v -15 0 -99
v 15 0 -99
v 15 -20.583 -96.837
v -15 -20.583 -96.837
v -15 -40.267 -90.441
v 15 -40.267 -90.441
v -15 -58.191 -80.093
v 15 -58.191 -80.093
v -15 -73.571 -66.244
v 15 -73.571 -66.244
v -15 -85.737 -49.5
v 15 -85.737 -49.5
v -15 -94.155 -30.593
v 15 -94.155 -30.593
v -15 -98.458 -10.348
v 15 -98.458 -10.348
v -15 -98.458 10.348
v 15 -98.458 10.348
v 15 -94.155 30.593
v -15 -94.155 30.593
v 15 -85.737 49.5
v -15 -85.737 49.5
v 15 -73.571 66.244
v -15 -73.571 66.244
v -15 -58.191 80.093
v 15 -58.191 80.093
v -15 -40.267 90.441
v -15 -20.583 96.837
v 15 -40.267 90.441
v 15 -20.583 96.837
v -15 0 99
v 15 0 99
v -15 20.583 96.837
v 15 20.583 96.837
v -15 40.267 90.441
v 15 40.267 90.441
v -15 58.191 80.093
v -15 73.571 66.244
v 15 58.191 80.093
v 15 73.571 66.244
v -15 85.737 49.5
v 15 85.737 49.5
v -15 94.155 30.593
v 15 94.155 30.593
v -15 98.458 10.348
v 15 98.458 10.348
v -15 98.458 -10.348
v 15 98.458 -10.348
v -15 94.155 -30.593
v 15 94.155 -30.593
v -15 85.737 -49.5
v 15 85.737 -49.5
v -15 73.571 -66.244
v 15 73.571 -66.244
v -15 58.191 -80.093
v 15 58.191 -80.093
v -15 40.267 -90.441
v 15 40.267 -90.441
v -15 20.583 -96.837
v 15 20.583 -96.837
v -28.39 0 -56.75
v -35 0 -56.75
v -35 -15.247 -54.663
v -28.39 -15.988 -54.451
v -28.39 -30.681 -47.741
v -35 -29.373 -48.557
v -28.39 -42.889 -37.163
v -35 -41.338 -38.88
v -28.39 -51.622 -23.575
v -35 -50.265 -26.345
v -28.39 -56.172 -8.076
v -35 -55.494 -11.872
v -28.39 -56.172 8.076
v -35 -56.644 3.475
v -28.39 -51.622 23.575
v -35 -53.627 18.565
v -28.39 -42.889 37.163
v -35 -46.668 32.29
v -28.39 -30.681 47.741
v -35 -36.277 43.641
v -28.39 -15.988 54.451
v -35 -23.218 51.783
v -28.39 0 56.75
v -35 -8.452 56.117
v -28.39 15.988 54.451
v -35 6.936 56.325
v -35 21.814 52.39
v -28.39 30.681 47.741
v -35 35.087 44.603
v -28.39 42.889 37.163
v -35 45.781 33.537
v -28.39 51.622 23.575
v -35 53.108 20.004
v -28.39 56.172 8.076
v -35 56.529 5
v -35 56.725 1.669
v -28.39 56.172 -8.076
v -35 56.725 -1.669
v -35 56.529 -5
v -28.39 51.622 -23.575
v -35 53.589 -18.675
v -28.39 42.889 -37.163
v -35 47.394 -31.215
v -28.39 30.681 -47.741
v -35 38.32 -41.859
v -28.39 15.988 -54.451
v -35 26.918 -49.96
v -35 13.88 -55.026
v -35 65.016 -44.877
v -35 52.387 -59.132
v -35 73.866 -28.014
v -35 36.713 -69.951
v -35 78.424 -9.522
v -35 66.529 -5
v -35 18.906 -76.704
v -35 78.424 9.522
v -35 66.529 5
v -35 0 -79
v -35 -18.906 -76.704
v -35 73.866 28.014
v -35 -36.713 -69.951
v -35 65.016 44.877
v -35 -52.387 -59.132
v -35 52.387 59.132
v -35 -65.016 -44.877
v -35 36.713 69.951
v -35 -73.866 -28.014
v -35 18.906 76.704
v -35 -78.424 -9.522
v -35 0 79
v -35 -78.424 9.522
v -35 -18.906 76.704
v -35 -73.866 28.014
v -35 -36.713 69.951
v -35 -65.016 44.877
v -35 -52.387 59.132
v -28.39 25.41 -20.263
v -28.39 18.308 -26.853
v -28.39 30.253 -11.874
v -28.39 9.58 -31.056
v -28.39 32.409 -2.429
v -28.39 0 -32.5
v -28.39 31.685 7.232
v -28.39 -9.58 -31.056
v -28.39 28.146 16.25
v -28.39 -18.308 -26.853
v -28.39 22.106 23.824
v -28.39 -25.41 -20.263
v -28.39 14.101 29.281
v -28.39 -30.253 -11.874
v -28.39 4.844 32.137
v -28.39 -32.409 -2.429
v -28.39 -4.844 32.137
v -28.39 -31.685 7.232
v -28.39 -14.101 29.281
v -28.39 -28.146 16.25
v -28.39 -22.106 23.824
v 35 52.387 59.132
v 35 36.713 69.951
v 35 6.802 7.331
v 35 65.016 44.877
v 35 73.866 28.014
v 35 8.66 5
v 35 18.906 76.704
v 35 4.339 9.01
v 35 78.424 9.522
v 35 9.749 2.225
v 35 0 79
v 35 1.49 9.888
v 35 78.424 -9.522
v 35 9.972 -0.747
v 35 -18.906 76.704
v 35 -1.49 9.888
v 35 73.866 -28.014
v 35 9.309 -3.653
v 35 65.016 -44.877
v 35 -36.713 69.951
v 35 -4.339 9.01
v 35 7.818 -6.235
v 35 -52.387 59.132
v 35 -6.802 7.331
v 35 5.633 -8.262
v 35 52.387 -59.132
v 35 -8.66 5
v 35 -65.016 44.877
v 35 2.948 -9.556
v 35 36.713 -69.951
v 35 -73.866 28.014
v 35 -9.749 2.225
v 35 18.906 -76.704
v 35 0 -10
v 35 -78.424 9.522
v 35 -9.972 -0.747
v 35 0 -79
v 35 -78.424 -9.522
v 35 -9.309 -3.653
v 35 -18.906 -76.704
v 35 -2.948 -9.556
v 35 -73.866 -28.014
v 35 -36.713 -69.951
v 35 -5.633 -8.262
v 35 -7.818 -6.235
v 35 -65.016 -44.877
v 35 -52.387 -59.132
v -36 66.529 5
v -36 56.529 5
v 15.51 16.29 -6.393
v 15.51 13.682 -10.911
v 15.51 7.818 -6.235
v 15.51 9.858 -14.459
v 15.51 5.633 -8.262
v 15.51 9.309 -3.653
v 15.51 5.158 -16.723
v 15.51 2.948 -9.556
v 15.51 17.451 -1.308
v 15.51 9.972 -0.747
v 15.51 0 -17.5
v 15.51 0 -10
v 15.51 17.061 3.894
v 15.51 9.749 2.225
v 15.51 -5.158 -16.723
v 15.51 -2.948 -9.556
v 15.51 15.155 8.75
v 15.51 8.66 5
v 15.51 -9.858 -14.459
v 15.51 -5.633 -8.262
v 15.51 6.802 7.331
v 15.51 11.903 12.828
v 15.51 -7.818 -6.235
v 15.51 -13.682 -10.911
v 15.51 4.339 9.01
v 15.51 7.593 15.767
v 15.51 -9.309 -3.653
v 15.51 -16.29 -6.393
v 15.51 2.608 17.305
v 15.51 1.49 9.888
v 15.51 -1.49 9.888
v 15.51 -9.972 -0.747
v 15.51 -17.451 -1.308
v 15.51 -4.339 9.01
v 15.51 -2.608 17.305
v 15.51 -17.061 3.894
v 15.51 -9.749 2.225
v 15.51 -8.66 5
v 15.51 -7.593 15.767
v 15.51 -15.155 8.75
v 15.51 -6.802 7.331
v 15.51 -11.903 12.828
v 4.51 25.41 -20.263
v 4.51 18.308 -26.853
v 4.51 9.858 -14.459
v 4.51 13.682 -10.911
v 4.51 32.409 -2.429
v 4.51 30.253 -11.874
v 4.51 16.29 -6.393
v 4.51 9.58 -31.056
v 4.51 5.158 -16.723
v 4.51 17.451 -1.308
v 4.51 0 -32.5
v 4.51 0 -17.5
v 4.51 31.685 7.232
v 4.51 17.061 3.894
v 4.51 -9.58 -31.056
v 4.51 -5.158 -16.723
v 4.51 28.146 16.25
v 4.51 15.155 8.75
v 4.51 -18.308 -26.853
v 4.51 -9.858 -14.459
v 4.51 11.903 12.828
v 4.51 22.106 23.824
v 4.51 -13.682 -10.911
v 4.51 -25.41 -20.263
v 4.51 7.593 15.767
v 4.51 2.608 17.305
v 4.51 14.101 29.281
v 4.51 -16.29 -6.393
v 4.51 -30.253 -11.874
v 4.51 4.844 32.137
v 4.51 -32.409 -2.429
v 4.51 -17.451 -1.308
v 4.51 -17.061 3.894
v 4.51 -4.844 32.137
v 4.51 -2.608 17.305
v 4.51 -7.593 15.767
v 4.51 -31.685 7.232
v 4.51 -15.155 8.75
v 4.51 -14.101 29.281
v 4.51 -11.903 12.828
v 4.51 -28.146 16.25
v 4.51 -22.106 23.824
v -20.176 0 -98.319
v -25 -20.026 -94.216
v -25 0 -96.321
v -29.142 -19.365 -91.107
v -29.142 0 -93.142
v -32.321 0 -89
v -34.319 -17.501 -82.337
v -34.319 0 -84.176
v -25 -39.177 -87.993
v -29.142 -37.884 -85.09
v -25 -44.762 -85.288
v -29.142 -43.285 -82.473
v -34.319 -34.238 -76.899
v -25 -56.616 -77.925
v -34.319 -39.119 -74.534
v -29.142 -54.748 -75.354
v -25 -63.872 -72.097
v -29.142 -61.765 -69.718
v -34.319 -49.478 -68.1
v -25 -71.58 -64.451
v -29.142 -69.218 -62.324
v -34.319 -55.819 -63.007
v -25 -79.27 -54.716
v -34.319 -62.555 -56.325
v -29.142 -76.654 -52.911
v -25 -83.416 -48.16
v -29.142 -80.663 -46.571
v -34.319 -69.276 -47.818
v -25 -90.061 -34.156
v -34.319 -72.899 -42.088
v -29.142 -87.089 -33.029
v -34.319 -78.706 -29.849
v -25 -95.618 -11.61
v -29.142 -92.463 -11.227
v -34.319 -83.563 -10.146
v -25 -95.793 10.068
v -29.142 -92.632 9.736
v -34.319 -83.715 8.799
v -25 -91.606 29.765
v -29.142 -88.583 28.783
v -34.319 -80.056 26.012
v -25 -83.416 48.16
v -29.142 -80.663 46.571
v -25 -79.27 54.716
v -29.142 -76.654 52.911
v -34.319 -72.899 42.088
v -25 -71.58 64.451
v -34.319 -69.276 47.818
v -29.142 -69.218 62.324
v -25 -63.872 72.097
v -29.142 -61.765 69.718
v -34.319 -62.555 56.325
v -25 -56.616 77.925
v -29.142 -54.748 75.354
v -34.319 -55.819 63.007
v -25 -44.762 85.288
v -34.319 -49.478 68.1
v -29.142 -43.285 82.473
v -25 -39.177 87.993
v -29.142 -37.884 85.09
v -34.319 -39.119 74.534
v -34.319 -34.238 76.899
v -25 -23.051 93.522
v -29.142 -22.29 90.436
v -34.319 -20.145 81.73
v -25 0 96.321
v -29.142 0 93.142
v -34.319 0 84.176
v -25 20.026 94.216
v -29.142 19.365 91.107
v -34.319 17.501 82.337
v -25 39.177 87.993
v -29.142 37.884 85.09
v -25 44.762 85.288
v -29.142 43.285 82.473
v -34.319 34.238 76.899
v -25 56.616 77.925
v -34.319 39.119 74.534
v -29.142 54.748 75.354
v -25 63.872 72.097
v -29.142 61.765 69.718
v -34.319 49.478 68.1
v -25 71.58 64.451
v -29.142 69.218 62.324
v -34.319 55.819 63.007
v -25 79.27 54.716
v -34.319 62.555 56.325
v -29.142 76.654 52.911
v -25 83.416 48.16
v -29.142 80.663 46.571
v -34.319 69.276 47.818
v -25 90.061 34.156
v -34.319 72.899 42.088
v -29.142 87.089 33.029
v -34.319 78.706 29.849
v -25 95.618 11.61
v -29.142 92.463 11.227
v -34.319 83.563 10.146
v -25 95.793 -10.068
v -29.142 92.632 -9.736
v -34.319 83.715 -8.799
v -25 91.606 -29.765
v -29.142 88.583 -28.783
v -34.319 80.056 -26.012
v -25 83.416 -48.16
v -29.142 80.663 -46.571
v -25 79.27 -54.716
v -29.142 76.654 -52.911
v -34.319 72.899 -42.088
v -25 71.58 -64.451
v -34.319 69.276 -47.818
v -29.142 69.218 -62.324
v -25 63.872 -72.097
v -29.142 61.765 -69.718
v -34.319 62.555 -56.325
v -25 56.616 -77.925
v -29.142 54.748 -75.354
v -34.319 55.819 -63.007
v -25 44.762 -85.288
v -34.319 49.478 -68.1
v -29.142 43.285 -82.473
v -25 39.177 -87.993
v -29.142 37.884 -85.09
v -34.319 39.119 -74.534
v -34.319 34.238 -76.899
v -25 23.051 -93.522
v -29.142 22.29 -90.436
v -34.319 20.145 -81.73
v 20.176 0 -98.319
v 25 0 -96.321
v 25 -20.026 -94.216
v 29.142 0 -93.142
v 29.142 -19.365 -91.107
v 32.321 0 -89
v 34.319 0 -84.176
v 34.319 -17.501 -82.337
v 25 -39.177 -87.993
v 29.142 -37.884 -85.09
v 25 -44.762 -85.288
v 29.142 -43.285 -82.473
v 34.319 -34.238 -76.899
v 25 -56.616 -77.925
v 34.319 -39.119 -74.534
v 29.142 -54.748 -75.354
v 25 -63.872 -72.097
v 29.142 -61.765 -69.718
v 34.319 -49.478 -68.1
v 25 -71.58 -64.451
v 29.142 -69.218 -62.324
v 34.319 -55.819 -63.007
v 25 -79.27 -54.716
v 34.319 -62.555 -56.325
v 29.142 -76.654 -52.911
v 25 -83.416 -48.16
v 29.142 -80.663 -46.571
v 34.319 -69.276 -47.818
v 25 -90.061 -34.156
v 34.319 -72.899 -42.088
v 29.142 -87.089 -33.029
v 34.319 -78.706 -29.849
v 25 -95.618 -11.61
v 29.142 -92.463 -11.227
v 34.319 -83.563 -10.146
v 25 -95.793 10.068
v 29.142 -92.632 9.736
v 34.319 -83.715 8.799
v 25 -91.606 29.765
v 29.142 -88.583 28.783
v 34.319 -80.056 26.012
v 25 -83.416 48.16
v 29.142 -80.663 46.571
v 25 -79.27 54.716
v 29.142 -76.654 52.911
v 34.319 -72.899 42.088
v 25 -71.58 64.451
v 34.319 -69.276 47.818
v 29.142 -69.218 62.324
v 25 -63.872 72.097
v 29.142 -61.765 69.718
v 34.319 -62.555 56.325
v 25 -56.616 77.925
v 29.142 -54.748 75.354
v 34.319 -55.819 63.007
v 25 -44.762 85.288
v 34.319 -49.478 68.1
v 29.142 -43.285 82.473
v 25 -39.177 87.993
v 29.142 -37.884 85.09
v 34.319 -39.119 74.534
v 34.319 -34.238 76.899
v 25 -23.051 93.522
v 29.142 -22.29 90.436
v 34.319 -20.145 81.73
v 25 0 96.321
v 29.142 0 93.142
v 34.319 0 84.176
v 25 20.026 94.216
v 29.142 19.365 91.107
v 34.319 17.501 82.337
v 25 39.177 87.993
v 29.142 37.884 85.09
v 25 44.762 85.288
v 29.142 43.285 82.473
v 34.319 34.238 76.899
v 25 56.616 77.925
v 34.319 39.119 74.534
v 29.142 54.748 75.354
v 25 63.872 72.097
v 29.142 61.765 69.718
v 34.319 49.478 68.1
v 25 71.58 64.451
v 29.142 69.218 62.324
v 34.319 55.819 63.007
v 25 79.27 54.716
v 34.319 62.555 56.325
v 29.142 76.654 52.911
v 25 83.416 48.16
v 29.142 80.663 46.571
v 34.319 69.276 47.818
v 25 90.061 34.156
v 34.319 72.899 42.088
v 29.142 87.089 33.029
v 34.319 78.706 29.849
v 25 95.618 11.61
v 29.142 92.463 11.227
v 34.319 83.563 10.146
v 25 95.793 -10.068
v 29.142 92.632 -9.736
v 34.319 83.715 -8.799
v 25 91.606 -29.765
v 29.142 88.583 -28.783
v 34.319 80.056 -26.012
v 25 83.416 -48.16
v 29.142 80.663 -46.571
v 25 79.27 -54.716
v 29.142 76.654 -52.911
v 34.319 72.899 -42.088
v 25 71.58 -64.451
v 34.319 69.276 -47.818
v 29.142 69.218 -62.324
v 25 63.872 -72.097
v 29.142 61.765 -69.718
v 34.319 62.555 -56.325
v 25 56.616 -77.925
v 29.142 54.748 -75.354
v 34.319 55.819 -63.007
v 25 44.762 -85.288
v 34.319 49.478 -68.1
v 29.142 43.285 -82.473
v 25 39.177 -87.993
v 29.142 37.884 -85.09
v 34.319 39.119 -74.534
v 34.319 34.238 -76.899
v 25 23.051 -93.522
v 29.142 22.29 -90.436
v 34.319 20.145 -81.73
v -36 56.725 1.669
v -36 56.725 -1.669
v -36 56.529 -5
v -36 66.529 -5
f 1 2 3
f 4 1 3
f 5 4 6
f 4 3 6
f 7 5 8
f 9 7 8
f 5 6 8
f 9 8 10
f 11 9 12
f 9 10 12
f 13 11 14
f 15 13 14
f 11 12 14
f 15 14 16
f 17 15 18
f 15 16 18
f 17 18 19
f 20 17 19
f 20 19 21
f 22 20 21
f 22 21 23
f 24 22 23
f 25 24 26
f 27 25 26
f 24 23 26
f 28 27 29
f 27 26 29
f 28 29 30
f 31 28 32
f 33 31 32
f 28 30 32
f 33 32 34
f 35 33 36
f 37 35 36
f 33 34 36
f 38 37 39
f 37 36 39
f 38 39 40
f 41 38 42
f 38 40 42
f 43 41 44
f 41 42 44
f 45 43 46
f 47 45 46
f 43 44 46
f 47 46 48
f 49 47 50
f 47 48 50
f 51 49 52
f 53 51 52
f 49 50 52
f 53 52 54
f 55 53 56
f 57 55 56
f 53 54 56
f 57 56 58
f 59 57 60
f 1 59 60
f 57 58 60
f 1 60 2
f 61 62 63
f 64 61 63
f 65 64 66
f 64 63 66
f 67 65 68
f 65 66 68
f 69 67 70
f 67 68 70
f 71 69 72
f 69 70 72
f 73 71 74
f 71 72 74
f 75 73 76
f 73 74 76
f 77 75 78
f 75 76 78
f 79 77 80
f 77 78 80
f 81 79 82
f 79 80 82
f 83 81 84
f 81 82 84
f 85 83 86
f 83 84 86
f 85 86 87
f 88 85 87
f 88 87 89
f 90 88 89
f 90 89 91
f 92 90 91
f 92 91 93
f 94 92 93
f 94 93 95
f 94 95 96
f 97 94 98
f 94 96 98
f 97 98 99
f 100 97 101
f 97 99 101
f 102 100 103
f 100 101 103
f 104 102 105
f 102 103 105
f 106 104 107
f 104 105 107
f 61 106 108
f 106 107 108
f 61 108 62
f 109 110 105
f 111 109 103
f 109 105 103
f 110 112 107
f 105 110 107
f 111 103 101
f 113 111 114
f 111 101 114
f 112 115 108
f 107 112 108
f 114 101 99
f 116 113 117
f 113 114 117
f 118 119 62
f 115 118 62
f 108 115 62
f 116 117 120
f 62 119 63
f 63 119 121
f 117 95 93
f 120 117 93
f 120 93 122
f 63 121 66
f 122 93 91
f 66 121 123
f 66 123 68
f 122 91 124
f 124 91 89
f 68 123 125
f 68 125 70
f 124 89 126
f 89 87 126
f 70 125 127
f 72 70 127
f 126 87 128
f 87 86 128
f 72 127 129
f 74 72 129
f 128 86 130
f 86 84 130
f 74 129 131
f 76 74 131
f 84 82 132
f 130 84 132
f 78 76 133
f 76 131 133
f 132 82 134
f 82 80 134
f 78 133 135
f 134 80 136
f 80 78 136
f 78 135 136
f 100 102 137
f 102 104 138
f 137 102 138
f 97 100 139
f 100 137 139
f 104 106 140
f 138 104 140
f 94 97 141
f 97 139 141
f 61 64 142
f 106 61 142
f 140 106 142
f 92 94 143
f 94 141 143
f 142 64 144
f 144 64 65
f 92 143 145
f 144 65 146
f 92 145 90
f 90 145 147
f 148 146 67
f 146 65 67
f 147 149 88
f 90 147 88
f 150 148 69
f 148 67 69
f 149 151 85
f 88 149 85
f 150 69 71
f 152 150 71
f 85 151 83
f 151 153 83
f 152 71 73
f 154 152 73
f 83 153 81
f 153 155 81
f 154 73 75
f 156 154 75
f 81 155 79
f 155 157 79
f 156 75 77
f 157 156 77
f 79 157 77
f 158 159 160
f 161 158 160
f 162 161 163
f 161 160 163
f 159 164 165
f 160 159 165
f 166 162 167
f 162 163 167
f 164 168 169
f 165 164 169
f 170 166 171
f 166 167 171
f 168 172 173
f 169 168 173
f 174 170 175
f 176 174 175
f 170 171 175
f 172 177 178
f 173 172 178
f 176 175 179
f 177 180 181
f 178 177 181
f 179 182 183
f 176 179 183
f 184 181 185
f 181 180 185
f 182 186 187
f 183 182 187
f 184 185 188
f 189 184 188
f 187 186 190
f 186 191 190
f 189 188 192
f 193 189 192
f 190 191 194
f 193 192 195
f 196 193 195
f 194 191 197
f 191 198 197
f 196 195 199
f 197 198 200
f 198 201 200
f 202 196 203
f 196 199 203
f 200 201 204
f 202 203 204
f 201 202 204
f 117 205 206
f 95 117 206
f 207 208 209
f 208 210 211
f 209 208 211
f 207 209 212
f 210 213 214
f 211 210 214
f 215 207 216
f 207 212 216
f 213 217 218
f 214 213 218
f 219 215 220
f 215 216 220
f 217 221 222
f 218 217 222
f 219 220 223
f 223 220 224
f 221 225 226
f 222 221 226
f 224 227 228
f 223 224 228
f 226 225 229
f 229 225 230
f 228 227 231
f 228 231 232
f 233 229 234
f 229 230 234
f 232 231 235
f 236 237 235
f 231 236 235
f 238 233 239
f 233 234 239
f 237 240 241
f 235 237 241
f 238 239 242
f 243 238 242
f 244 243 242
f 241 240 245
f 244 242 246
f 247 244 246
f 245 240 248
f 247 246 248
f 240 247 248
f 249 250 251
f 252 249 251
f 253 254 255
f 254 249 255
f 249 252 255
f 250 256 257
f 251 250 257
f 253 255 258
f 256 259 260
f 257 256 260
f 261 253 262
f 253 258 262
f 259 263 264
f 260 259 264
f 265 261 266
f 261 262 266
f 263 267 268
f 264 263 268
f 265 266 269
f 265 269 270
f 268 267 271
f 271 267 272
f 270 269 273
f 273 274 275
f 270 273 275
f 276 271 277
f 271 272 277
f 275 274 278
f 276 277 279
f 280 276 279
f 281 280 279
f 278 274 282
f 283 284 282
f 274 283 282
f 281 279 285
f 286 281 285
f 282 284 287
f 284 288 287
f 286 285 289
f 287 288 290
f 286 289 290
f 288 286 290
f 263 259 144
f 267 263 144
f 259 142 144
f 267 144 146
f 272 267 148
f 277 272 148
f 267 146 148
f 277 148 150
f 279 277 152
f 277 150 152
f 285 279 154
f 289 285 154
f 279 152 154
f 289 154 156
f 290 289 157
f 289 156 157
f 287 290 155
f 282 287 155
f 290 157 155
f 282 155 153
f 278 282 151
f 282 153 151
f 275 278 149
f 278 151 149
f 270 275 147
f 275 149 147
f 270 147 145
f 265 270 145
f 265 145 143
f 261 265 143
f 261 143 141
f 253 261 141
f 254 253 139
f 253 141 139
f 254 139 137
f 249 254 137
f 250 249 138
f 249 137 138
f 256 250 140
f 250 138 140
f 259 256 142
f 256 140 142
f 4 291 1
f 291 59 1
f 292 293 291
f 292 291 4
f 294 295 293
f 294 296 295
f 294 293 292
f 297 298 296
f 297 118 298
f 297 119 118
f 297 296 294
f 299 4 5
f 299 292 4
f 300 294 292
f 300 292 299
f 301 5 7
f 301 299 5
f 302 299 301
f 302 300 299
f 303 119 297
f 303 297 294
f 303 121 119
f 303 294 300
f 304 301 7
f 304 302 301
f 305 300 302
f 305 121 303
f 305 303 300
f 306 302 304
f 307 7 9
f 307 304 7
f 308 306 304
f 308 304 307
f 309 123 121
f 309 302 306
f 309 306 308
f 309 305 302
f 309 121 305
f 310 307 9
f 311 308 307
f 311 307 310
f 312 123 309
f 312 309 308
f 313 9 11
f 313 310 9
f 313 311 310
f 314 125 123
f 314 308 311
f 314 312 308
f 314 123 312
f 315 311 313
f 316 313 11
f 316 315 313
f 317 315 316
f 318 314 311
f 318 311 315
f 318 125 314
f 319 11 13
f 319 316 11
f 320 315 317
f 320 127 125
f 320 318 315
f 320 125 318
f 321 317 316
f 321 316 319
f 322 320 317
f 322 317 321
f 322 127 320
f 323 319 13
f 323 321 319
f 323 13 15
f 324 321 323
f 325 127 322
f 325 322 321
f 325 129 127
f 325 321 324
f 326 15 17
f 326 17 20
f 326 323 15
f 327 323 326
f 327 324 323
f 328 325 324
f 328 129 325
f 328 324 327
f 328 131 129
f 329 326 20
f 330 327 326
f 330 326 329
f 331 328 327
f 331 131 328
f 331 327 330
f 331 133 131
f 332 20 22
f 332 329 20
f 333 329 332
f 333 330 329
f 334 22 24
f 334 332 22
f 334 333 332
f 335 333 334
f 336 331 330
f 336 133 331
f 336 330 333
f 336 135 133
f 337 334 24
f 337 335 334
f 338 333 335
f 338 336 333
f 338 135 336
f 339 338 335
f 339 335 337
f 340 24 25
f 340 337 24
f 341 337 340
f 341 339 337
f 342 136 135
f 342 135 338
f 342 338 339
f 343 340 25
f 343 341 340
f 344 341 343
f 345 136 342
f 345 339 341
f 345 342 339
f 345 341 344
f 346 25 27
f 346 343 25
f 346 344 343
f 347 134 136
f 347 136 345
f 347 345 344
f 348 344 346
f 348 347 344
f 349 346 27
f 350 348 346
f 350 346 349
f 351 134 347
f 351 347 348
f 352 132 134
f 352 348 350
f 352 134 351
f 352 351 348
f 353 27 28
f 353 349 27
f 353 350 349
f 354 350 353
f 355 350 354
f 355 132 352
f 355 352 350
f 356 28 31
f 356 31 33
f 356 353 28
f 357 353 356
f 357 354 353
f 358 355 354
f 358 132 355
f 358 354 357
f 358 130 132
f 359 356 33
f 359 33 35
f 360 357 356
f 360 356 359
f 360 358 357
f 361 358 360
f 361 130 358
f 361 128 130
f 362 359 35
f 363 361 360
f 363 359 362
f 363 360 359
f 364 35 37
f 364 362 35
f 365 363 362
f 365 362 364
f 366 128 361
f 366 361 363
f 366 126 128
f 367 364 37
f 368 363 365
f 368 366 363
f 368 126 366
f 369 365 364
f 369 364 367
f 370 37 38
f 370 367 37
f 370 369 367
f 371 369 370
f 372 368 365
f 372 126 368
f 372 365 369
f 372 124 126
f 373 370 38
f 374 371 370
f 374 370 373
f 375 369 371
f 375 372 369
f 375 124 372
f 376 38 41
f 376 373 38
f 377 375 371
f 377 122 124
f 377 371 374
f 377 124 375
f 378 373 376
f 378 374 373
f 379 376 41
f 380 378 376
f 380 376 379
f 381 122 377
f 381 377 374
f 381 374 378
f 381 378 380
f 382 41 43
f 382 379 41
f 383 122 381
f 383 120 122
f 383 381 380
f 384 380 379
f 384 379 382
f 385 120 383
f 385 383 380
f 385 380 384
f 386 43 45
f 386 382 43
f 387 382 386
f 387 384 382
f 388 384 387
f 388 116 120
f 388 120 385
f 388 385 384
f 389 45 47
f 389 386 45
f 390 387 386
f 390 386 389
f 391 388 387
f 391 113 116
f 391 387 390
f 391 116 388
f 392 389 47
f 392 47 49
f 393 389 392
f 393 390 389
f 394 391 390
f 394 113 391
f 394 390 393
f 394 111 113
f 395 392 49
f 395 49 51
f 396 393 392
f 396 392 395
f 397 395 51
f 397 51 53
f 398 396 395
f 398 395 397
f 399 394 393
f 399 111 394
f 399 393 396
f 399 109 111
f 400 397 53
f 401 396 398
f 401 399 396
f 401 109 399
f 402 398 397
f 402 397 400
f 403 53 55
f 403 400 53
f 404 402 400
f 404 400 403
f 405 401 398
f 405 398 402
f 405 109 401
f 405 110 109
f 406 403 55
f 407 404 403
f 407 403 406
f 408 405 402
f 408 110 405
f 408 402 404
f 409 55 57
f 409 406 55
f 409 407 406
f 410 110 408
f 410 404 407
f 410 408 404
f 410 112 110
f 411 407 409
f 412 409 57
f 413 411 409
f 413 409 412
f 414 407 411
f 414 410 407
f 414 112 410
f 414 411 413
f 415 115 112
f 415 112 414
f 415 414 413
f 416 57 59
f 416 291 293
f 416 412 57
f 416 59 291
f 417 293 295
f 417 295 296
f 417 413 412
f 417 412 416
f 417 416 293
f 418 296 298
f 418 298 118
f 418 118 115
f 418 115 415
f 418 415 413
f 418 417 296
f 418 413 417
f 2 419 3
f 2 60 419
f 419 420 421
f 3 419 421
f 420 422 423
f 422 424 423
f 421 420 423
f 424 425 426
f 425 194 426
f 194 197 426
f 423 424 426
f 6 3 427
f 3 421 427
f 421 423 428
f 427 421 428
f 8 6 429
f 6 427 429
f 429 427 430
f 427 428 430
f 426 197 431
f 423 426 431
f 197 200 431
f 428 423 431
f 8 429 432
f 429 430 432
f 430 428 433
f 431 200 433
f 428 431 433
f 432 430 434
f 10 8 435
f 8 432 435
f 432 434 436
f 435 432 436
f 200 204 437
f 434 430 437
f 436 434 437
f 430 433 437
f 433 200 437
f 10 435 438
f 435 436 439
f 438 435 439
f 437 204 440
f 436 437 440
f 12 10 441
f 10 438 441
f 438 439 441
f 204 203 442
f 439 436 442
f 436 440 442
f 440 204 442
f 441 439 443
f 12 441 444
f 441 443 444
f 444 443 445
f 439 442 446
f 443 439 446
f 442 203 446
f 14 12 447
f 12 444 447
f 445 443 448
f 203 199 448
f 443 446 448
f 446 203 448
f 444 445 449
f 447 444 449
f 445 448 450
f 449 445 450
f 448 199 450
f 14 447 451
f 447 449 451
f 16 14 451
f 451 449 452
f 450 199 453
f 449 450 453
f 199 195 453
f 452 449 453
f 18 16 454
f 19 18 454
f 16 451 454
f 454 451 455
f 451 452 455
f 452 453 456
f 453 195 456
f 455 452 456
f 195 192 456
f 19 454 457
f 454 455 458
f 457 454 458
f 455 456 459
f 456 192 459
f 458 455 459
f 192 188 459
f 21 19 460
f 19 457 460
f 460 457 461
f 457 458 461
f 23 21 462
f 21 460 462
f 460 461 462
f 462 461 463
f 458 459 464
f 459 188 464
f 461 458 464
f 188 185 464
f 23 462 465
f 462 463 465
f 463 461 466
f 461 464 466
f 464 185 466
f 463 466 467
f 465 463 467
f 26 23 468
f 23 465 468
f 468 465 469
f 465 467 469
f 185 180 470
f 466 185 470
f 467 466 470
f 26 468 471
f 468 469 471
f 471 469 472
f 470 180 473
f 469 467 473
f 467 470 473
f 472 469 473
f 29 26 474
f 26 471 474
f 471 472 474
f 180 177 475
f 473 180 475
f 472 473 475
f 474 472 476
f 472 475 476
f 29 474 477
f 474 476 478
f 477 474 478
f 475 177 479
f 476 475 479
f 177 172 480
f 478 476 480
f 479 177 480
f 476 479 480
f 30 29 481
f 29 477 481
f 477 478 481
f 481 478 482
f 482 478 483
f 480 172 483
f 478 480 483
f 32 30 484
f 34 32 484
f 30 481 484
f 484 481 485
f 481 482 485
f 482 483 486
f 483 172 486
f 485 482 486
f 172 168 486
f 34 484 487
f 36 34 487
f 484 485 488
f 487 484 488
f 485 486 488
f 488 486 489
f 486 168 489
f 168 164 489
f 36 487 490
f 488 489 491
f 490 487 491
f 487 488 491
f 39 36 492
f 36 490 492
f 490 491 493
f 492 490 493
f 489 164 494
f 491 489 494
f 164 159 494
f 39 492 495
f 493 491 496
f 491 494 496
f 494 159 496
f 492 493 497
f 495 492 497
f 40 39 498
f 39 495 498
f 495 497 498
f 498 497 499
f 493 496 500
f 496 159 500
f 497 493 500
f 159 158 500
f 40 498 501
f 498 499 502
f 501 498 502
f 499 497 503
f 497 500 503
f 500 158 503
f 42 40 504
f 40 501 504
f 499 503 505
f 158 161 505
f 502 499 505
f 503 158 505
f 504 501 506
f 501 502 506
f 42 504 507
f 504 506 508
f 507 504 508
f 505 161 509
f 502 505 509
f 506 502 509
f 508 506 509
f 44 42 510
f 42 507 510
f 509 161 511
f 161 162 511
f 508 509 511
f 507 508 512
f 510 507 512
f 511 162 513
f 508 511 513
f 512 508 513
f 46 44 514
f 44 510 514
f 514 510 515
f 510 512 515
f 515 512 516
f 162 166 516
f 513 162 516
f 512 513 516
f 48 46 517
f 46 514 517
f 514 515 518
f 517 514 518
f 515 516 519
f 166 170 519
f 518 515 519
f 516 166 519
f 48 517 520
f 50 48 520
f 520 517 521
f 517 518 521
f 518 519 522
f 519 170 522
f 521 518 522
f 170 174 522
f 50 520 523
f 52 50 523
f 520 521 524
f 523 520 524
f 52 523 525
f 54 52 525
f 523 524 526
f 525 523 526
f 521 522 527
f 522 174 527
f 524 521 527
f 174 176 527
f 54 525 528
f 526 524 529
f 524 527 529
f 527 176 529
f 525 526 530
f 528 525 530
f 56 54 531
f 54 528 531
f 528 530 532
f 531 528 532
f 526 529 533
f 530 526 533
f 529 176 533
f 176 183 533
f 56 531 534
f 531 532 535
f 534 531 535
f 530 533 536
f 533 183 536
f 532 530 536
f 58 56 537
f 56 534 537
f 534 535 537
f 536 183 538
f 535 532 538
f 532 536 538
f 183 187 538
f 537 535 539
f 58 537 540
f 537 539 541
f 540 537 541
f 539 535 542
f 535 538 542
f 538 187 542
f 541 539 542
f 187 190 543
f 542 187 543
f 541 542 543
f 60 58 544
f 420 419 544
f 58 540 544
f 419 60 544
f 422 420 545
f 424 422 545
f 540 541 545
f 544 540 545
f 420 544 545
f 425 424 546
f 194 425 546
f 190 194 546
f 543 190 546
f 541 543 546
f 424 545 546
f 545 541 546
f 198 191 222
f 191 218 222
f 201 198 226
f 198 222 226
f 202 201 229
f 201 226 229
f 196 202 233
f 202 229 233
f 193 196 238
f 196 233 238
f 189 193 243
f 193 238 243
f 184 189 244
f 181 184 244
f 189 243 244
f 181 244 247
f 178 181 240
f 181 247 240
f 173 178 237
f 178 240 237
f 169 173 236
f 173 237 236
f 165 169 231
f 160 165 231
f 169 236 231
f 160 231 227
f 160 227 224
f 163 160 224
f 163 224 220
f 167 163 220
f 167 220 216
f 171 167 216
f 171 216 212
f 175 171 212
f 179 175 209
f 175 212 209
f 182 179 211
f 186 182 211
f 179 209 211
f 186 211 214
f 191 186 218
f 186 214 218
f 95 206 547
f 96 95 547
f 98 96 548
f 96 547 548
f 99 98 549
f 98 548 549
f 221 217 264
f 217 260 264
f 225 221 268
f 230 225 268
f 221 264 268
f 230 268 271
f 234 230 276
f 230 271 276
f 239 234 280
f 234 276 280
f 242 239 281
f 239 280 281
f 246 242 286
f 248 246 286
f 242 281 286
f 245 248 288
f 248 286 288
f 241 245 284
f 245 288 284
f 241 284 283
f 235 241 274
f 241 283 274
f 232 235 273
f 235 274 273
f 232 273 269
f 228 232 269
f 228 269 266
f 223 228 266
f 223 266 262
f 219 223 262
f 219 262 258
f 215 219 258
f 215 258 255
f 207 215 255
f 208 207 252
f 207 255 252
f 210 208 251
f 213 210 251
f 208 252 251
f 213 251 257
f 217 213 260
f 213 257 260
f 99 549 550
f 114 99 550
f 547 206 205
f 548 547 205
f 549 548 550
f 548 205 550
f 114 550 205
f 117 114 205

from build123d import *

# Parameters (mm, degrees)
RACCORDO1_R                  = 20
ESTRUSIONE_ESTRUSIONE1_START = 1
ESTRUSIONE_ESTRUSIONE1_DEPTH = 1


with BuildPart() as part:
    # Schizzo1 → Rivoluzione1 (revolve)
    with BuildSketch(Plane.XY):
        Polygon((-35, 98.99999999999999), (35, 98.99999999999999), (35.000000000000014, 9.999999999999995), (15.510000000000021, 9.999999999999996), (15.51000000000002, 17.499999999999996), (4.510000000000019, 17.499999999999996), (4.510000000000019, 32.49999999999999), (-28.38999999999998, 32.49999999999998), (-28.38999999999998, 56.74999999999999), (-35, 56.74999999999999), align=None)
    revolve(axis=Axis((44.99999999999999, 0, 0), (-1, 0, 0)))

    # Raccordo1
    raccordo1_edges = [part.edges().sort_by_distance(p)[0] for p in [
        (35, -98.99999999999999, -1.212e-14),
        (-35.00000000000001, -98.99999999999999, -1.212e-14),
    ]]
    fillet(raccordo1_edges, radius=RACCORDO1_R)

    # Schizzo2 → Estrusione-Estrusione1 (add)
    with BuildSketch(Plane.ZY.offset(35).offset(ESTRUSIONE_ESTRUSIONE1_START)):
        with BuildLine():
            Line((-5, 66.52930655863382), (5, 66.52930655863382))
            Line((5, 66.52930655863382), (5, 56.52930655863382))
            ThreePointArc((5, 56.52930655863382), (3.47e-15, 56.75000000000001), (-4.999999999999998, 56.52930655863382))
            Line((-4.999999999999998, 56.52930655863382), (-5, 66.52930655863382))
        make_face()
    extrude(amount=-ESTRUSIONE_ESTRUSIONE1_DEPTH)


solid = part.part
